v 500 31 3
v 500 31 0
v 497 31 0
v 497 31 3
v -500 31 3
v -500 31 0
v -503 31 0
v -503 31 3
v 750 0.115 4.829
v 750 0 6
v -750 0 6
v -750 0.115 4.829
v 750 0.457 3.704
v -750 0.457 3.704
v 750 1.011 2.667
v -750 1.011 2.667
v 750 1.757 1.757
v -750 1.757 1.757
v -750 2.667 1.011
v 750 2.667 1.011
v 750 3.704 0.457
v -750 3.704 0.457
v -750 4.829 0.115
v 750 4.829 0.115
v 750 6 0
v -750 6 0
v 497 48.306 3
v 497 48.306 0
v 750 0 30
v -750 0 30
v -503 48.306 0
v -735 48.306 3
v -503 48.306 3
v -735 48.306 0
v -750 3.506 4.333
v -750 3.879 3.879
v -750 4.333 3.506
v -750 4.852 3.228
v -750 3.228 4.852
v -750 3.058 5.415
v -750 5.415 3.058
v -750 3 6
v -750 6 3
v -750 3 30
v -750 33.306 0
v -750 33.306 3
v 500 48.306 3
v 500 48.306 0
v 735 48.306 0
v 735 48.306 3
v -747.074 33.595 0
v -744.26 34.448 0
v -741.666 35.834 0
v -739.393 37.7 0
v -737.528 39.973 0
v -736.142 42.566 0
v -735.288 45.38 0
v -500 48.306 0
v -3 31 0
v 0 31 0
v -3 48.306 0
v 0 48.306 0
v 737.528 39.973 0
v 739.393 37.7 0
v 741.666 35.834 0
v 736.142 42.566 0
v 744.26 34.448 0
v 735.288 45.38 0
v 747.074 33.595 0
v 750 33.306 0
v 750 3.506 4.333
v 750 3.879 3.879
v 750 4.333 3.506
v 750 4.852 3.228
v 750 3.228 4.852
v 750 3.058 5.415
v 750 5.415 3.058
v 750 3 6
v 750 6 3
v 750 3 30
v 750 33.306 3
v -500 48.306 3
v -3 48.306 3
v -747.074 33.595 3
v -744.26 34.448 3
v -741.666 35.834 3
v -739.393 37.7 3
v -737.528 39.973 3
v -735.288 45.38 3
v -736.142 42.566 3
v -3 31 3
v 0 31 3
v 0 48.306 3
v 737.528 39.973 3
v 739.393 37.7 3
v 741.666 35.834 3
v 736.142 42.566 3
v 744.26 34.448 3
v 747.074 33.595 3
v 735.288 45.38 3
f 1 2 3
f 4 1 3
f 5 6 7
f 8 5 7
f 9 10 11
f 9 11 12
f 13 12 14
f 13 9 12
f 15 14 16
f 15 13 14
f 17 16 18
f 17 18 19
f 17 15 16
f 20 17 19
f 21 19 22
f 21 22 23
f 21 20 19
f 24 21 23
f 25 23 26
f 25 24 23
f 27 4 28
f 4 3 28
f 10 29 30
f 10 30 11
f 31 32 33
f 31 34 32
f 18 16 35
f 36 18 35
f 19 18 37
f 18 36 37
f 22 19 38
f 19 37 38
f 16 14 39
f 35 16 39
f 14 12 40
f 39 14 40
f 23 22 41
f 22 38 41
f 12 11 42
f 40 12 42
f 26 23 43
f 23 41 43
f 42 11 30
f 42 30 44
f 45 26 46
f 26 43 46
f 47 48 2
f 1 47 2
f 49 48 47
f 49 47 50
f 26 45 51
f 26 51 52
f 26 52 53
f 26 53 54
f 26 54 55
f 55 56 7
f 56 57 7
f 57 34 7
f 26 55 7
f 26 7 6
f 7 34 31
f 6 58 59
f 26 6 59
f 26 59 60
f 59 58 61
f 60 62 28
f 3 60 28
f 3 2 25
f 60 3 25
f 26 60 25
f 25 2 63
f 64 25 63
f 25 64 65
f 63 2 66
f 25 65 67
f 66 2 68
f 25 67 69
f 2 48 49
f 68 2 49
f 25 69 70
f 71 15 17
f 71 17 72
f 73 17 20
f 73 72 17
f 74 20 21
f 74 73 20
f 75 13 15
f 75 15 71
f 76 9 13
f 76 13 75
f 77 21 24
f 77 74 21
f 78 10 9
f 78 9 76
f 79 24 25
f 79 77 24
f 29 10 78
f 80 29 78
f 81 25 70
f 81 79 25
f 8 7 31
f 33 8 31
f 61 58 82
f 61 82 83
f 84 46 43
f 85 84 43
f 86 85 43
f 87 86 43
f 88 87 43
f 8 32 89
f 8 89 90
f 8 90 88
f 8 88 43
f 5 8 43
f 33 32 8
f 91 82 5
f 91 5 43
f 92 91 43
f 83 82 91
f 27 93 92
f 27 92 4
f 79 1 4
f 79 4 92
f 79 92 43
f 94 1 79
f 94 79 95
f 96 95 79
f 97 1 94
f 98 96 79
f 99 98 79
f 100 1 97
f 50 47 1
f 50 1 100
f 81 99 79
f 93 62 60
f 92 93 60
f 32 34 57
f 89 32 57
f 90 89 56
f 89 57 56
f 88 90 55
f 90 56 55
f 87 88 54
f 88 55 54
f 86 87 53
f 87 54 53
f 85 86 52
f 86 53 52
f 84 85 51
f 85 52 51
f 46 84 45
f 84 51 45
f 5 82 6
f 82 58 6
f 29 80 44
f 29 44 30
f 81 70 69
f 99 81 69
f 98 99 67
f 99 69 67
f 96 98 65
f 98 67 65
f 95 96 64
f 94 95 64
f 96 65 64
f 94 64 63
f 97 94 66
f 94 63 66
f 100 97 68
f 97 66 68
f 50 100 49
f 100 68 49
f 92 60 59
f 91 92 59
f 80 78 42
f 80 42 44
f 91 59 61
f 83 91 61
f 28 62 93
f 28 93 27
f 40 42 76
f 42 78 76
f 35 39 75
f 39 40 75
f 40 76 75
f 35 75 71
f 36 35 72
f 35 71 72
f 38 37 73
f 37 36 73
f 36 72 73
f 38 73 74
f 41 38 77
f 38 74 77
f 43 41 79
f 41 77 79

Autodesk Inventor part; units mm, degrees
ref_plane "YZ Plane" through (0, 0, 0) normal (1, 0, 0) x (0, 1, 0)
ref_plane "XZ Plane" through (0, 0, 0) normal (0, 1, 0) x (-1, 0, 0)
ref_plane "XY Plane" through (0, 0, 0) normal (0, 0, 1) x (1, 0, 0)
sketch "Sketch1" plane through (0, 0, 0) normal (0, 0, 1) x (1, 0, 0)
  line L0 (-750, 48.3063) -> (750, 48.3063)
  line L1 (750, 48.3063) -> (750, 0)
  line L2 (750, 0) -> (-750, 0)
  line L3 (-750, 0) -> (-750, 48.3063)
  point P0 (0, 0)
  point P1 (0, 0)
  dimension "d0" = 1500
  dimension "d1" = 48.3063
extrude "Plate1" add sketch "Sketch1" along normal blind 3
sketch "Sketch2" plane through (750, 3, 0) normal (0, -1, 0) x (1, 0, 0)
  line L0 (-1500, 0) -> (0, 0)
  line L1 (0, 0) -> (0, 30)
  line L2 (0, 30) -> (-1500, 30)
  line L3 (-1500, 30) -> (-1500, 0)
edge flange "Flange1" height 30 angle 90 thickness 3 bend radius 3 thickness toward (0, -1, 0) relief tear relief width 3 relief depth 1.5 edges at (0, 0, 3) wall of the first edge with corners at (-750, 3, 0) (750, 3, 0) (750, 3, 30) (-750, 3, 30)
bend "Bend1"
corner "Corner1"
sketch "Sketch5" plane through (0, 0, 0) normal (0, 0, -1) x (-1, 0, 0)
  line L0 (750, 48.3063) -> (-750, 48.3063) projected
  line L1 (500, 48.3063) -> (500, 31)
  line L2 (500, 31) -> (503, 31)
  line L3 (503, 31) -> (503, 48.3063)
  line L4 (750, 0) -> (-750, 0) projected
  point P0 (0, 0)
  dimension "d18" = 3
  dimension "d19" = 247
  dimension "d20" = 31
extrude "Extrusion1" cut sketch "Sketch5" against normal through all
pattern_linear "Rectangular Pattern1" count 3 spacing 500 along (1, 0, 0) of "Extrusion1"
sketch "Sketch6" plane through (0, 0, 0) normal (0, 0, -1) x (-1, 0, 0)
  line L0 (-750, 48.3063) -> (-750, 6) projected
  circle A0 centre (-750, 48.3063) radius 15
  line L1 (-750, 48.3063) -> (-500, 48.3063) projected
  point P0 (0, 0)
  point P1 (-735, 48.3063)
  point P2 (-750, 33.3063)
  dimension "d24" = 30
extrude "Extrusion2" cut sketch "Sketch6" against normal through all contours L1 A0 L0 picked at (-740.1254, 47.1937)
mirror "Mirror1" about plane through (0, 0, 0) normal (1, 0, 0) of "Extrusion2"
equation "\"d1\" = Стрингер_4"
equation "\"d18\" = Thickness"
equation "\"d2\" = Thickness"
equation "\"d3\" = BendReliefWidth"
equation "\"d4\" = BendReliefDepth"
equation "\"d5\" = MinimumRemnant"
equation "\"d6\" = TransitionRadius"
equation "\"d9\" = BendRadius"
equation "\"d10\" = CornerReliefSize"
equation "\"d11\" = GapSize"
equation "\"d12\" = JacobiRadiusSize"
equation "\"BendRadius\" = Thickness"
equation "\"BendReliefWidth\" = Thickness"
equation "\"BendReliefDepth\" = 0.5 * Thickness"
equation "\"CornerReliefSize\" = 4 * Thickness"
equation "\"MinimumRemnant\" = 2 * Thickness"
equation "\"TransitionRadius\" = BendRadius"
equation "\"JacobiRadiusSize\" = BendRadius"
equation "\"GapSize\" = Thickness"
equation "\"Стрингер_4\" = 48.306299"
equation "\"Thickness\" = 3"
properties part number "МОО 054 стрингер борт 41"
